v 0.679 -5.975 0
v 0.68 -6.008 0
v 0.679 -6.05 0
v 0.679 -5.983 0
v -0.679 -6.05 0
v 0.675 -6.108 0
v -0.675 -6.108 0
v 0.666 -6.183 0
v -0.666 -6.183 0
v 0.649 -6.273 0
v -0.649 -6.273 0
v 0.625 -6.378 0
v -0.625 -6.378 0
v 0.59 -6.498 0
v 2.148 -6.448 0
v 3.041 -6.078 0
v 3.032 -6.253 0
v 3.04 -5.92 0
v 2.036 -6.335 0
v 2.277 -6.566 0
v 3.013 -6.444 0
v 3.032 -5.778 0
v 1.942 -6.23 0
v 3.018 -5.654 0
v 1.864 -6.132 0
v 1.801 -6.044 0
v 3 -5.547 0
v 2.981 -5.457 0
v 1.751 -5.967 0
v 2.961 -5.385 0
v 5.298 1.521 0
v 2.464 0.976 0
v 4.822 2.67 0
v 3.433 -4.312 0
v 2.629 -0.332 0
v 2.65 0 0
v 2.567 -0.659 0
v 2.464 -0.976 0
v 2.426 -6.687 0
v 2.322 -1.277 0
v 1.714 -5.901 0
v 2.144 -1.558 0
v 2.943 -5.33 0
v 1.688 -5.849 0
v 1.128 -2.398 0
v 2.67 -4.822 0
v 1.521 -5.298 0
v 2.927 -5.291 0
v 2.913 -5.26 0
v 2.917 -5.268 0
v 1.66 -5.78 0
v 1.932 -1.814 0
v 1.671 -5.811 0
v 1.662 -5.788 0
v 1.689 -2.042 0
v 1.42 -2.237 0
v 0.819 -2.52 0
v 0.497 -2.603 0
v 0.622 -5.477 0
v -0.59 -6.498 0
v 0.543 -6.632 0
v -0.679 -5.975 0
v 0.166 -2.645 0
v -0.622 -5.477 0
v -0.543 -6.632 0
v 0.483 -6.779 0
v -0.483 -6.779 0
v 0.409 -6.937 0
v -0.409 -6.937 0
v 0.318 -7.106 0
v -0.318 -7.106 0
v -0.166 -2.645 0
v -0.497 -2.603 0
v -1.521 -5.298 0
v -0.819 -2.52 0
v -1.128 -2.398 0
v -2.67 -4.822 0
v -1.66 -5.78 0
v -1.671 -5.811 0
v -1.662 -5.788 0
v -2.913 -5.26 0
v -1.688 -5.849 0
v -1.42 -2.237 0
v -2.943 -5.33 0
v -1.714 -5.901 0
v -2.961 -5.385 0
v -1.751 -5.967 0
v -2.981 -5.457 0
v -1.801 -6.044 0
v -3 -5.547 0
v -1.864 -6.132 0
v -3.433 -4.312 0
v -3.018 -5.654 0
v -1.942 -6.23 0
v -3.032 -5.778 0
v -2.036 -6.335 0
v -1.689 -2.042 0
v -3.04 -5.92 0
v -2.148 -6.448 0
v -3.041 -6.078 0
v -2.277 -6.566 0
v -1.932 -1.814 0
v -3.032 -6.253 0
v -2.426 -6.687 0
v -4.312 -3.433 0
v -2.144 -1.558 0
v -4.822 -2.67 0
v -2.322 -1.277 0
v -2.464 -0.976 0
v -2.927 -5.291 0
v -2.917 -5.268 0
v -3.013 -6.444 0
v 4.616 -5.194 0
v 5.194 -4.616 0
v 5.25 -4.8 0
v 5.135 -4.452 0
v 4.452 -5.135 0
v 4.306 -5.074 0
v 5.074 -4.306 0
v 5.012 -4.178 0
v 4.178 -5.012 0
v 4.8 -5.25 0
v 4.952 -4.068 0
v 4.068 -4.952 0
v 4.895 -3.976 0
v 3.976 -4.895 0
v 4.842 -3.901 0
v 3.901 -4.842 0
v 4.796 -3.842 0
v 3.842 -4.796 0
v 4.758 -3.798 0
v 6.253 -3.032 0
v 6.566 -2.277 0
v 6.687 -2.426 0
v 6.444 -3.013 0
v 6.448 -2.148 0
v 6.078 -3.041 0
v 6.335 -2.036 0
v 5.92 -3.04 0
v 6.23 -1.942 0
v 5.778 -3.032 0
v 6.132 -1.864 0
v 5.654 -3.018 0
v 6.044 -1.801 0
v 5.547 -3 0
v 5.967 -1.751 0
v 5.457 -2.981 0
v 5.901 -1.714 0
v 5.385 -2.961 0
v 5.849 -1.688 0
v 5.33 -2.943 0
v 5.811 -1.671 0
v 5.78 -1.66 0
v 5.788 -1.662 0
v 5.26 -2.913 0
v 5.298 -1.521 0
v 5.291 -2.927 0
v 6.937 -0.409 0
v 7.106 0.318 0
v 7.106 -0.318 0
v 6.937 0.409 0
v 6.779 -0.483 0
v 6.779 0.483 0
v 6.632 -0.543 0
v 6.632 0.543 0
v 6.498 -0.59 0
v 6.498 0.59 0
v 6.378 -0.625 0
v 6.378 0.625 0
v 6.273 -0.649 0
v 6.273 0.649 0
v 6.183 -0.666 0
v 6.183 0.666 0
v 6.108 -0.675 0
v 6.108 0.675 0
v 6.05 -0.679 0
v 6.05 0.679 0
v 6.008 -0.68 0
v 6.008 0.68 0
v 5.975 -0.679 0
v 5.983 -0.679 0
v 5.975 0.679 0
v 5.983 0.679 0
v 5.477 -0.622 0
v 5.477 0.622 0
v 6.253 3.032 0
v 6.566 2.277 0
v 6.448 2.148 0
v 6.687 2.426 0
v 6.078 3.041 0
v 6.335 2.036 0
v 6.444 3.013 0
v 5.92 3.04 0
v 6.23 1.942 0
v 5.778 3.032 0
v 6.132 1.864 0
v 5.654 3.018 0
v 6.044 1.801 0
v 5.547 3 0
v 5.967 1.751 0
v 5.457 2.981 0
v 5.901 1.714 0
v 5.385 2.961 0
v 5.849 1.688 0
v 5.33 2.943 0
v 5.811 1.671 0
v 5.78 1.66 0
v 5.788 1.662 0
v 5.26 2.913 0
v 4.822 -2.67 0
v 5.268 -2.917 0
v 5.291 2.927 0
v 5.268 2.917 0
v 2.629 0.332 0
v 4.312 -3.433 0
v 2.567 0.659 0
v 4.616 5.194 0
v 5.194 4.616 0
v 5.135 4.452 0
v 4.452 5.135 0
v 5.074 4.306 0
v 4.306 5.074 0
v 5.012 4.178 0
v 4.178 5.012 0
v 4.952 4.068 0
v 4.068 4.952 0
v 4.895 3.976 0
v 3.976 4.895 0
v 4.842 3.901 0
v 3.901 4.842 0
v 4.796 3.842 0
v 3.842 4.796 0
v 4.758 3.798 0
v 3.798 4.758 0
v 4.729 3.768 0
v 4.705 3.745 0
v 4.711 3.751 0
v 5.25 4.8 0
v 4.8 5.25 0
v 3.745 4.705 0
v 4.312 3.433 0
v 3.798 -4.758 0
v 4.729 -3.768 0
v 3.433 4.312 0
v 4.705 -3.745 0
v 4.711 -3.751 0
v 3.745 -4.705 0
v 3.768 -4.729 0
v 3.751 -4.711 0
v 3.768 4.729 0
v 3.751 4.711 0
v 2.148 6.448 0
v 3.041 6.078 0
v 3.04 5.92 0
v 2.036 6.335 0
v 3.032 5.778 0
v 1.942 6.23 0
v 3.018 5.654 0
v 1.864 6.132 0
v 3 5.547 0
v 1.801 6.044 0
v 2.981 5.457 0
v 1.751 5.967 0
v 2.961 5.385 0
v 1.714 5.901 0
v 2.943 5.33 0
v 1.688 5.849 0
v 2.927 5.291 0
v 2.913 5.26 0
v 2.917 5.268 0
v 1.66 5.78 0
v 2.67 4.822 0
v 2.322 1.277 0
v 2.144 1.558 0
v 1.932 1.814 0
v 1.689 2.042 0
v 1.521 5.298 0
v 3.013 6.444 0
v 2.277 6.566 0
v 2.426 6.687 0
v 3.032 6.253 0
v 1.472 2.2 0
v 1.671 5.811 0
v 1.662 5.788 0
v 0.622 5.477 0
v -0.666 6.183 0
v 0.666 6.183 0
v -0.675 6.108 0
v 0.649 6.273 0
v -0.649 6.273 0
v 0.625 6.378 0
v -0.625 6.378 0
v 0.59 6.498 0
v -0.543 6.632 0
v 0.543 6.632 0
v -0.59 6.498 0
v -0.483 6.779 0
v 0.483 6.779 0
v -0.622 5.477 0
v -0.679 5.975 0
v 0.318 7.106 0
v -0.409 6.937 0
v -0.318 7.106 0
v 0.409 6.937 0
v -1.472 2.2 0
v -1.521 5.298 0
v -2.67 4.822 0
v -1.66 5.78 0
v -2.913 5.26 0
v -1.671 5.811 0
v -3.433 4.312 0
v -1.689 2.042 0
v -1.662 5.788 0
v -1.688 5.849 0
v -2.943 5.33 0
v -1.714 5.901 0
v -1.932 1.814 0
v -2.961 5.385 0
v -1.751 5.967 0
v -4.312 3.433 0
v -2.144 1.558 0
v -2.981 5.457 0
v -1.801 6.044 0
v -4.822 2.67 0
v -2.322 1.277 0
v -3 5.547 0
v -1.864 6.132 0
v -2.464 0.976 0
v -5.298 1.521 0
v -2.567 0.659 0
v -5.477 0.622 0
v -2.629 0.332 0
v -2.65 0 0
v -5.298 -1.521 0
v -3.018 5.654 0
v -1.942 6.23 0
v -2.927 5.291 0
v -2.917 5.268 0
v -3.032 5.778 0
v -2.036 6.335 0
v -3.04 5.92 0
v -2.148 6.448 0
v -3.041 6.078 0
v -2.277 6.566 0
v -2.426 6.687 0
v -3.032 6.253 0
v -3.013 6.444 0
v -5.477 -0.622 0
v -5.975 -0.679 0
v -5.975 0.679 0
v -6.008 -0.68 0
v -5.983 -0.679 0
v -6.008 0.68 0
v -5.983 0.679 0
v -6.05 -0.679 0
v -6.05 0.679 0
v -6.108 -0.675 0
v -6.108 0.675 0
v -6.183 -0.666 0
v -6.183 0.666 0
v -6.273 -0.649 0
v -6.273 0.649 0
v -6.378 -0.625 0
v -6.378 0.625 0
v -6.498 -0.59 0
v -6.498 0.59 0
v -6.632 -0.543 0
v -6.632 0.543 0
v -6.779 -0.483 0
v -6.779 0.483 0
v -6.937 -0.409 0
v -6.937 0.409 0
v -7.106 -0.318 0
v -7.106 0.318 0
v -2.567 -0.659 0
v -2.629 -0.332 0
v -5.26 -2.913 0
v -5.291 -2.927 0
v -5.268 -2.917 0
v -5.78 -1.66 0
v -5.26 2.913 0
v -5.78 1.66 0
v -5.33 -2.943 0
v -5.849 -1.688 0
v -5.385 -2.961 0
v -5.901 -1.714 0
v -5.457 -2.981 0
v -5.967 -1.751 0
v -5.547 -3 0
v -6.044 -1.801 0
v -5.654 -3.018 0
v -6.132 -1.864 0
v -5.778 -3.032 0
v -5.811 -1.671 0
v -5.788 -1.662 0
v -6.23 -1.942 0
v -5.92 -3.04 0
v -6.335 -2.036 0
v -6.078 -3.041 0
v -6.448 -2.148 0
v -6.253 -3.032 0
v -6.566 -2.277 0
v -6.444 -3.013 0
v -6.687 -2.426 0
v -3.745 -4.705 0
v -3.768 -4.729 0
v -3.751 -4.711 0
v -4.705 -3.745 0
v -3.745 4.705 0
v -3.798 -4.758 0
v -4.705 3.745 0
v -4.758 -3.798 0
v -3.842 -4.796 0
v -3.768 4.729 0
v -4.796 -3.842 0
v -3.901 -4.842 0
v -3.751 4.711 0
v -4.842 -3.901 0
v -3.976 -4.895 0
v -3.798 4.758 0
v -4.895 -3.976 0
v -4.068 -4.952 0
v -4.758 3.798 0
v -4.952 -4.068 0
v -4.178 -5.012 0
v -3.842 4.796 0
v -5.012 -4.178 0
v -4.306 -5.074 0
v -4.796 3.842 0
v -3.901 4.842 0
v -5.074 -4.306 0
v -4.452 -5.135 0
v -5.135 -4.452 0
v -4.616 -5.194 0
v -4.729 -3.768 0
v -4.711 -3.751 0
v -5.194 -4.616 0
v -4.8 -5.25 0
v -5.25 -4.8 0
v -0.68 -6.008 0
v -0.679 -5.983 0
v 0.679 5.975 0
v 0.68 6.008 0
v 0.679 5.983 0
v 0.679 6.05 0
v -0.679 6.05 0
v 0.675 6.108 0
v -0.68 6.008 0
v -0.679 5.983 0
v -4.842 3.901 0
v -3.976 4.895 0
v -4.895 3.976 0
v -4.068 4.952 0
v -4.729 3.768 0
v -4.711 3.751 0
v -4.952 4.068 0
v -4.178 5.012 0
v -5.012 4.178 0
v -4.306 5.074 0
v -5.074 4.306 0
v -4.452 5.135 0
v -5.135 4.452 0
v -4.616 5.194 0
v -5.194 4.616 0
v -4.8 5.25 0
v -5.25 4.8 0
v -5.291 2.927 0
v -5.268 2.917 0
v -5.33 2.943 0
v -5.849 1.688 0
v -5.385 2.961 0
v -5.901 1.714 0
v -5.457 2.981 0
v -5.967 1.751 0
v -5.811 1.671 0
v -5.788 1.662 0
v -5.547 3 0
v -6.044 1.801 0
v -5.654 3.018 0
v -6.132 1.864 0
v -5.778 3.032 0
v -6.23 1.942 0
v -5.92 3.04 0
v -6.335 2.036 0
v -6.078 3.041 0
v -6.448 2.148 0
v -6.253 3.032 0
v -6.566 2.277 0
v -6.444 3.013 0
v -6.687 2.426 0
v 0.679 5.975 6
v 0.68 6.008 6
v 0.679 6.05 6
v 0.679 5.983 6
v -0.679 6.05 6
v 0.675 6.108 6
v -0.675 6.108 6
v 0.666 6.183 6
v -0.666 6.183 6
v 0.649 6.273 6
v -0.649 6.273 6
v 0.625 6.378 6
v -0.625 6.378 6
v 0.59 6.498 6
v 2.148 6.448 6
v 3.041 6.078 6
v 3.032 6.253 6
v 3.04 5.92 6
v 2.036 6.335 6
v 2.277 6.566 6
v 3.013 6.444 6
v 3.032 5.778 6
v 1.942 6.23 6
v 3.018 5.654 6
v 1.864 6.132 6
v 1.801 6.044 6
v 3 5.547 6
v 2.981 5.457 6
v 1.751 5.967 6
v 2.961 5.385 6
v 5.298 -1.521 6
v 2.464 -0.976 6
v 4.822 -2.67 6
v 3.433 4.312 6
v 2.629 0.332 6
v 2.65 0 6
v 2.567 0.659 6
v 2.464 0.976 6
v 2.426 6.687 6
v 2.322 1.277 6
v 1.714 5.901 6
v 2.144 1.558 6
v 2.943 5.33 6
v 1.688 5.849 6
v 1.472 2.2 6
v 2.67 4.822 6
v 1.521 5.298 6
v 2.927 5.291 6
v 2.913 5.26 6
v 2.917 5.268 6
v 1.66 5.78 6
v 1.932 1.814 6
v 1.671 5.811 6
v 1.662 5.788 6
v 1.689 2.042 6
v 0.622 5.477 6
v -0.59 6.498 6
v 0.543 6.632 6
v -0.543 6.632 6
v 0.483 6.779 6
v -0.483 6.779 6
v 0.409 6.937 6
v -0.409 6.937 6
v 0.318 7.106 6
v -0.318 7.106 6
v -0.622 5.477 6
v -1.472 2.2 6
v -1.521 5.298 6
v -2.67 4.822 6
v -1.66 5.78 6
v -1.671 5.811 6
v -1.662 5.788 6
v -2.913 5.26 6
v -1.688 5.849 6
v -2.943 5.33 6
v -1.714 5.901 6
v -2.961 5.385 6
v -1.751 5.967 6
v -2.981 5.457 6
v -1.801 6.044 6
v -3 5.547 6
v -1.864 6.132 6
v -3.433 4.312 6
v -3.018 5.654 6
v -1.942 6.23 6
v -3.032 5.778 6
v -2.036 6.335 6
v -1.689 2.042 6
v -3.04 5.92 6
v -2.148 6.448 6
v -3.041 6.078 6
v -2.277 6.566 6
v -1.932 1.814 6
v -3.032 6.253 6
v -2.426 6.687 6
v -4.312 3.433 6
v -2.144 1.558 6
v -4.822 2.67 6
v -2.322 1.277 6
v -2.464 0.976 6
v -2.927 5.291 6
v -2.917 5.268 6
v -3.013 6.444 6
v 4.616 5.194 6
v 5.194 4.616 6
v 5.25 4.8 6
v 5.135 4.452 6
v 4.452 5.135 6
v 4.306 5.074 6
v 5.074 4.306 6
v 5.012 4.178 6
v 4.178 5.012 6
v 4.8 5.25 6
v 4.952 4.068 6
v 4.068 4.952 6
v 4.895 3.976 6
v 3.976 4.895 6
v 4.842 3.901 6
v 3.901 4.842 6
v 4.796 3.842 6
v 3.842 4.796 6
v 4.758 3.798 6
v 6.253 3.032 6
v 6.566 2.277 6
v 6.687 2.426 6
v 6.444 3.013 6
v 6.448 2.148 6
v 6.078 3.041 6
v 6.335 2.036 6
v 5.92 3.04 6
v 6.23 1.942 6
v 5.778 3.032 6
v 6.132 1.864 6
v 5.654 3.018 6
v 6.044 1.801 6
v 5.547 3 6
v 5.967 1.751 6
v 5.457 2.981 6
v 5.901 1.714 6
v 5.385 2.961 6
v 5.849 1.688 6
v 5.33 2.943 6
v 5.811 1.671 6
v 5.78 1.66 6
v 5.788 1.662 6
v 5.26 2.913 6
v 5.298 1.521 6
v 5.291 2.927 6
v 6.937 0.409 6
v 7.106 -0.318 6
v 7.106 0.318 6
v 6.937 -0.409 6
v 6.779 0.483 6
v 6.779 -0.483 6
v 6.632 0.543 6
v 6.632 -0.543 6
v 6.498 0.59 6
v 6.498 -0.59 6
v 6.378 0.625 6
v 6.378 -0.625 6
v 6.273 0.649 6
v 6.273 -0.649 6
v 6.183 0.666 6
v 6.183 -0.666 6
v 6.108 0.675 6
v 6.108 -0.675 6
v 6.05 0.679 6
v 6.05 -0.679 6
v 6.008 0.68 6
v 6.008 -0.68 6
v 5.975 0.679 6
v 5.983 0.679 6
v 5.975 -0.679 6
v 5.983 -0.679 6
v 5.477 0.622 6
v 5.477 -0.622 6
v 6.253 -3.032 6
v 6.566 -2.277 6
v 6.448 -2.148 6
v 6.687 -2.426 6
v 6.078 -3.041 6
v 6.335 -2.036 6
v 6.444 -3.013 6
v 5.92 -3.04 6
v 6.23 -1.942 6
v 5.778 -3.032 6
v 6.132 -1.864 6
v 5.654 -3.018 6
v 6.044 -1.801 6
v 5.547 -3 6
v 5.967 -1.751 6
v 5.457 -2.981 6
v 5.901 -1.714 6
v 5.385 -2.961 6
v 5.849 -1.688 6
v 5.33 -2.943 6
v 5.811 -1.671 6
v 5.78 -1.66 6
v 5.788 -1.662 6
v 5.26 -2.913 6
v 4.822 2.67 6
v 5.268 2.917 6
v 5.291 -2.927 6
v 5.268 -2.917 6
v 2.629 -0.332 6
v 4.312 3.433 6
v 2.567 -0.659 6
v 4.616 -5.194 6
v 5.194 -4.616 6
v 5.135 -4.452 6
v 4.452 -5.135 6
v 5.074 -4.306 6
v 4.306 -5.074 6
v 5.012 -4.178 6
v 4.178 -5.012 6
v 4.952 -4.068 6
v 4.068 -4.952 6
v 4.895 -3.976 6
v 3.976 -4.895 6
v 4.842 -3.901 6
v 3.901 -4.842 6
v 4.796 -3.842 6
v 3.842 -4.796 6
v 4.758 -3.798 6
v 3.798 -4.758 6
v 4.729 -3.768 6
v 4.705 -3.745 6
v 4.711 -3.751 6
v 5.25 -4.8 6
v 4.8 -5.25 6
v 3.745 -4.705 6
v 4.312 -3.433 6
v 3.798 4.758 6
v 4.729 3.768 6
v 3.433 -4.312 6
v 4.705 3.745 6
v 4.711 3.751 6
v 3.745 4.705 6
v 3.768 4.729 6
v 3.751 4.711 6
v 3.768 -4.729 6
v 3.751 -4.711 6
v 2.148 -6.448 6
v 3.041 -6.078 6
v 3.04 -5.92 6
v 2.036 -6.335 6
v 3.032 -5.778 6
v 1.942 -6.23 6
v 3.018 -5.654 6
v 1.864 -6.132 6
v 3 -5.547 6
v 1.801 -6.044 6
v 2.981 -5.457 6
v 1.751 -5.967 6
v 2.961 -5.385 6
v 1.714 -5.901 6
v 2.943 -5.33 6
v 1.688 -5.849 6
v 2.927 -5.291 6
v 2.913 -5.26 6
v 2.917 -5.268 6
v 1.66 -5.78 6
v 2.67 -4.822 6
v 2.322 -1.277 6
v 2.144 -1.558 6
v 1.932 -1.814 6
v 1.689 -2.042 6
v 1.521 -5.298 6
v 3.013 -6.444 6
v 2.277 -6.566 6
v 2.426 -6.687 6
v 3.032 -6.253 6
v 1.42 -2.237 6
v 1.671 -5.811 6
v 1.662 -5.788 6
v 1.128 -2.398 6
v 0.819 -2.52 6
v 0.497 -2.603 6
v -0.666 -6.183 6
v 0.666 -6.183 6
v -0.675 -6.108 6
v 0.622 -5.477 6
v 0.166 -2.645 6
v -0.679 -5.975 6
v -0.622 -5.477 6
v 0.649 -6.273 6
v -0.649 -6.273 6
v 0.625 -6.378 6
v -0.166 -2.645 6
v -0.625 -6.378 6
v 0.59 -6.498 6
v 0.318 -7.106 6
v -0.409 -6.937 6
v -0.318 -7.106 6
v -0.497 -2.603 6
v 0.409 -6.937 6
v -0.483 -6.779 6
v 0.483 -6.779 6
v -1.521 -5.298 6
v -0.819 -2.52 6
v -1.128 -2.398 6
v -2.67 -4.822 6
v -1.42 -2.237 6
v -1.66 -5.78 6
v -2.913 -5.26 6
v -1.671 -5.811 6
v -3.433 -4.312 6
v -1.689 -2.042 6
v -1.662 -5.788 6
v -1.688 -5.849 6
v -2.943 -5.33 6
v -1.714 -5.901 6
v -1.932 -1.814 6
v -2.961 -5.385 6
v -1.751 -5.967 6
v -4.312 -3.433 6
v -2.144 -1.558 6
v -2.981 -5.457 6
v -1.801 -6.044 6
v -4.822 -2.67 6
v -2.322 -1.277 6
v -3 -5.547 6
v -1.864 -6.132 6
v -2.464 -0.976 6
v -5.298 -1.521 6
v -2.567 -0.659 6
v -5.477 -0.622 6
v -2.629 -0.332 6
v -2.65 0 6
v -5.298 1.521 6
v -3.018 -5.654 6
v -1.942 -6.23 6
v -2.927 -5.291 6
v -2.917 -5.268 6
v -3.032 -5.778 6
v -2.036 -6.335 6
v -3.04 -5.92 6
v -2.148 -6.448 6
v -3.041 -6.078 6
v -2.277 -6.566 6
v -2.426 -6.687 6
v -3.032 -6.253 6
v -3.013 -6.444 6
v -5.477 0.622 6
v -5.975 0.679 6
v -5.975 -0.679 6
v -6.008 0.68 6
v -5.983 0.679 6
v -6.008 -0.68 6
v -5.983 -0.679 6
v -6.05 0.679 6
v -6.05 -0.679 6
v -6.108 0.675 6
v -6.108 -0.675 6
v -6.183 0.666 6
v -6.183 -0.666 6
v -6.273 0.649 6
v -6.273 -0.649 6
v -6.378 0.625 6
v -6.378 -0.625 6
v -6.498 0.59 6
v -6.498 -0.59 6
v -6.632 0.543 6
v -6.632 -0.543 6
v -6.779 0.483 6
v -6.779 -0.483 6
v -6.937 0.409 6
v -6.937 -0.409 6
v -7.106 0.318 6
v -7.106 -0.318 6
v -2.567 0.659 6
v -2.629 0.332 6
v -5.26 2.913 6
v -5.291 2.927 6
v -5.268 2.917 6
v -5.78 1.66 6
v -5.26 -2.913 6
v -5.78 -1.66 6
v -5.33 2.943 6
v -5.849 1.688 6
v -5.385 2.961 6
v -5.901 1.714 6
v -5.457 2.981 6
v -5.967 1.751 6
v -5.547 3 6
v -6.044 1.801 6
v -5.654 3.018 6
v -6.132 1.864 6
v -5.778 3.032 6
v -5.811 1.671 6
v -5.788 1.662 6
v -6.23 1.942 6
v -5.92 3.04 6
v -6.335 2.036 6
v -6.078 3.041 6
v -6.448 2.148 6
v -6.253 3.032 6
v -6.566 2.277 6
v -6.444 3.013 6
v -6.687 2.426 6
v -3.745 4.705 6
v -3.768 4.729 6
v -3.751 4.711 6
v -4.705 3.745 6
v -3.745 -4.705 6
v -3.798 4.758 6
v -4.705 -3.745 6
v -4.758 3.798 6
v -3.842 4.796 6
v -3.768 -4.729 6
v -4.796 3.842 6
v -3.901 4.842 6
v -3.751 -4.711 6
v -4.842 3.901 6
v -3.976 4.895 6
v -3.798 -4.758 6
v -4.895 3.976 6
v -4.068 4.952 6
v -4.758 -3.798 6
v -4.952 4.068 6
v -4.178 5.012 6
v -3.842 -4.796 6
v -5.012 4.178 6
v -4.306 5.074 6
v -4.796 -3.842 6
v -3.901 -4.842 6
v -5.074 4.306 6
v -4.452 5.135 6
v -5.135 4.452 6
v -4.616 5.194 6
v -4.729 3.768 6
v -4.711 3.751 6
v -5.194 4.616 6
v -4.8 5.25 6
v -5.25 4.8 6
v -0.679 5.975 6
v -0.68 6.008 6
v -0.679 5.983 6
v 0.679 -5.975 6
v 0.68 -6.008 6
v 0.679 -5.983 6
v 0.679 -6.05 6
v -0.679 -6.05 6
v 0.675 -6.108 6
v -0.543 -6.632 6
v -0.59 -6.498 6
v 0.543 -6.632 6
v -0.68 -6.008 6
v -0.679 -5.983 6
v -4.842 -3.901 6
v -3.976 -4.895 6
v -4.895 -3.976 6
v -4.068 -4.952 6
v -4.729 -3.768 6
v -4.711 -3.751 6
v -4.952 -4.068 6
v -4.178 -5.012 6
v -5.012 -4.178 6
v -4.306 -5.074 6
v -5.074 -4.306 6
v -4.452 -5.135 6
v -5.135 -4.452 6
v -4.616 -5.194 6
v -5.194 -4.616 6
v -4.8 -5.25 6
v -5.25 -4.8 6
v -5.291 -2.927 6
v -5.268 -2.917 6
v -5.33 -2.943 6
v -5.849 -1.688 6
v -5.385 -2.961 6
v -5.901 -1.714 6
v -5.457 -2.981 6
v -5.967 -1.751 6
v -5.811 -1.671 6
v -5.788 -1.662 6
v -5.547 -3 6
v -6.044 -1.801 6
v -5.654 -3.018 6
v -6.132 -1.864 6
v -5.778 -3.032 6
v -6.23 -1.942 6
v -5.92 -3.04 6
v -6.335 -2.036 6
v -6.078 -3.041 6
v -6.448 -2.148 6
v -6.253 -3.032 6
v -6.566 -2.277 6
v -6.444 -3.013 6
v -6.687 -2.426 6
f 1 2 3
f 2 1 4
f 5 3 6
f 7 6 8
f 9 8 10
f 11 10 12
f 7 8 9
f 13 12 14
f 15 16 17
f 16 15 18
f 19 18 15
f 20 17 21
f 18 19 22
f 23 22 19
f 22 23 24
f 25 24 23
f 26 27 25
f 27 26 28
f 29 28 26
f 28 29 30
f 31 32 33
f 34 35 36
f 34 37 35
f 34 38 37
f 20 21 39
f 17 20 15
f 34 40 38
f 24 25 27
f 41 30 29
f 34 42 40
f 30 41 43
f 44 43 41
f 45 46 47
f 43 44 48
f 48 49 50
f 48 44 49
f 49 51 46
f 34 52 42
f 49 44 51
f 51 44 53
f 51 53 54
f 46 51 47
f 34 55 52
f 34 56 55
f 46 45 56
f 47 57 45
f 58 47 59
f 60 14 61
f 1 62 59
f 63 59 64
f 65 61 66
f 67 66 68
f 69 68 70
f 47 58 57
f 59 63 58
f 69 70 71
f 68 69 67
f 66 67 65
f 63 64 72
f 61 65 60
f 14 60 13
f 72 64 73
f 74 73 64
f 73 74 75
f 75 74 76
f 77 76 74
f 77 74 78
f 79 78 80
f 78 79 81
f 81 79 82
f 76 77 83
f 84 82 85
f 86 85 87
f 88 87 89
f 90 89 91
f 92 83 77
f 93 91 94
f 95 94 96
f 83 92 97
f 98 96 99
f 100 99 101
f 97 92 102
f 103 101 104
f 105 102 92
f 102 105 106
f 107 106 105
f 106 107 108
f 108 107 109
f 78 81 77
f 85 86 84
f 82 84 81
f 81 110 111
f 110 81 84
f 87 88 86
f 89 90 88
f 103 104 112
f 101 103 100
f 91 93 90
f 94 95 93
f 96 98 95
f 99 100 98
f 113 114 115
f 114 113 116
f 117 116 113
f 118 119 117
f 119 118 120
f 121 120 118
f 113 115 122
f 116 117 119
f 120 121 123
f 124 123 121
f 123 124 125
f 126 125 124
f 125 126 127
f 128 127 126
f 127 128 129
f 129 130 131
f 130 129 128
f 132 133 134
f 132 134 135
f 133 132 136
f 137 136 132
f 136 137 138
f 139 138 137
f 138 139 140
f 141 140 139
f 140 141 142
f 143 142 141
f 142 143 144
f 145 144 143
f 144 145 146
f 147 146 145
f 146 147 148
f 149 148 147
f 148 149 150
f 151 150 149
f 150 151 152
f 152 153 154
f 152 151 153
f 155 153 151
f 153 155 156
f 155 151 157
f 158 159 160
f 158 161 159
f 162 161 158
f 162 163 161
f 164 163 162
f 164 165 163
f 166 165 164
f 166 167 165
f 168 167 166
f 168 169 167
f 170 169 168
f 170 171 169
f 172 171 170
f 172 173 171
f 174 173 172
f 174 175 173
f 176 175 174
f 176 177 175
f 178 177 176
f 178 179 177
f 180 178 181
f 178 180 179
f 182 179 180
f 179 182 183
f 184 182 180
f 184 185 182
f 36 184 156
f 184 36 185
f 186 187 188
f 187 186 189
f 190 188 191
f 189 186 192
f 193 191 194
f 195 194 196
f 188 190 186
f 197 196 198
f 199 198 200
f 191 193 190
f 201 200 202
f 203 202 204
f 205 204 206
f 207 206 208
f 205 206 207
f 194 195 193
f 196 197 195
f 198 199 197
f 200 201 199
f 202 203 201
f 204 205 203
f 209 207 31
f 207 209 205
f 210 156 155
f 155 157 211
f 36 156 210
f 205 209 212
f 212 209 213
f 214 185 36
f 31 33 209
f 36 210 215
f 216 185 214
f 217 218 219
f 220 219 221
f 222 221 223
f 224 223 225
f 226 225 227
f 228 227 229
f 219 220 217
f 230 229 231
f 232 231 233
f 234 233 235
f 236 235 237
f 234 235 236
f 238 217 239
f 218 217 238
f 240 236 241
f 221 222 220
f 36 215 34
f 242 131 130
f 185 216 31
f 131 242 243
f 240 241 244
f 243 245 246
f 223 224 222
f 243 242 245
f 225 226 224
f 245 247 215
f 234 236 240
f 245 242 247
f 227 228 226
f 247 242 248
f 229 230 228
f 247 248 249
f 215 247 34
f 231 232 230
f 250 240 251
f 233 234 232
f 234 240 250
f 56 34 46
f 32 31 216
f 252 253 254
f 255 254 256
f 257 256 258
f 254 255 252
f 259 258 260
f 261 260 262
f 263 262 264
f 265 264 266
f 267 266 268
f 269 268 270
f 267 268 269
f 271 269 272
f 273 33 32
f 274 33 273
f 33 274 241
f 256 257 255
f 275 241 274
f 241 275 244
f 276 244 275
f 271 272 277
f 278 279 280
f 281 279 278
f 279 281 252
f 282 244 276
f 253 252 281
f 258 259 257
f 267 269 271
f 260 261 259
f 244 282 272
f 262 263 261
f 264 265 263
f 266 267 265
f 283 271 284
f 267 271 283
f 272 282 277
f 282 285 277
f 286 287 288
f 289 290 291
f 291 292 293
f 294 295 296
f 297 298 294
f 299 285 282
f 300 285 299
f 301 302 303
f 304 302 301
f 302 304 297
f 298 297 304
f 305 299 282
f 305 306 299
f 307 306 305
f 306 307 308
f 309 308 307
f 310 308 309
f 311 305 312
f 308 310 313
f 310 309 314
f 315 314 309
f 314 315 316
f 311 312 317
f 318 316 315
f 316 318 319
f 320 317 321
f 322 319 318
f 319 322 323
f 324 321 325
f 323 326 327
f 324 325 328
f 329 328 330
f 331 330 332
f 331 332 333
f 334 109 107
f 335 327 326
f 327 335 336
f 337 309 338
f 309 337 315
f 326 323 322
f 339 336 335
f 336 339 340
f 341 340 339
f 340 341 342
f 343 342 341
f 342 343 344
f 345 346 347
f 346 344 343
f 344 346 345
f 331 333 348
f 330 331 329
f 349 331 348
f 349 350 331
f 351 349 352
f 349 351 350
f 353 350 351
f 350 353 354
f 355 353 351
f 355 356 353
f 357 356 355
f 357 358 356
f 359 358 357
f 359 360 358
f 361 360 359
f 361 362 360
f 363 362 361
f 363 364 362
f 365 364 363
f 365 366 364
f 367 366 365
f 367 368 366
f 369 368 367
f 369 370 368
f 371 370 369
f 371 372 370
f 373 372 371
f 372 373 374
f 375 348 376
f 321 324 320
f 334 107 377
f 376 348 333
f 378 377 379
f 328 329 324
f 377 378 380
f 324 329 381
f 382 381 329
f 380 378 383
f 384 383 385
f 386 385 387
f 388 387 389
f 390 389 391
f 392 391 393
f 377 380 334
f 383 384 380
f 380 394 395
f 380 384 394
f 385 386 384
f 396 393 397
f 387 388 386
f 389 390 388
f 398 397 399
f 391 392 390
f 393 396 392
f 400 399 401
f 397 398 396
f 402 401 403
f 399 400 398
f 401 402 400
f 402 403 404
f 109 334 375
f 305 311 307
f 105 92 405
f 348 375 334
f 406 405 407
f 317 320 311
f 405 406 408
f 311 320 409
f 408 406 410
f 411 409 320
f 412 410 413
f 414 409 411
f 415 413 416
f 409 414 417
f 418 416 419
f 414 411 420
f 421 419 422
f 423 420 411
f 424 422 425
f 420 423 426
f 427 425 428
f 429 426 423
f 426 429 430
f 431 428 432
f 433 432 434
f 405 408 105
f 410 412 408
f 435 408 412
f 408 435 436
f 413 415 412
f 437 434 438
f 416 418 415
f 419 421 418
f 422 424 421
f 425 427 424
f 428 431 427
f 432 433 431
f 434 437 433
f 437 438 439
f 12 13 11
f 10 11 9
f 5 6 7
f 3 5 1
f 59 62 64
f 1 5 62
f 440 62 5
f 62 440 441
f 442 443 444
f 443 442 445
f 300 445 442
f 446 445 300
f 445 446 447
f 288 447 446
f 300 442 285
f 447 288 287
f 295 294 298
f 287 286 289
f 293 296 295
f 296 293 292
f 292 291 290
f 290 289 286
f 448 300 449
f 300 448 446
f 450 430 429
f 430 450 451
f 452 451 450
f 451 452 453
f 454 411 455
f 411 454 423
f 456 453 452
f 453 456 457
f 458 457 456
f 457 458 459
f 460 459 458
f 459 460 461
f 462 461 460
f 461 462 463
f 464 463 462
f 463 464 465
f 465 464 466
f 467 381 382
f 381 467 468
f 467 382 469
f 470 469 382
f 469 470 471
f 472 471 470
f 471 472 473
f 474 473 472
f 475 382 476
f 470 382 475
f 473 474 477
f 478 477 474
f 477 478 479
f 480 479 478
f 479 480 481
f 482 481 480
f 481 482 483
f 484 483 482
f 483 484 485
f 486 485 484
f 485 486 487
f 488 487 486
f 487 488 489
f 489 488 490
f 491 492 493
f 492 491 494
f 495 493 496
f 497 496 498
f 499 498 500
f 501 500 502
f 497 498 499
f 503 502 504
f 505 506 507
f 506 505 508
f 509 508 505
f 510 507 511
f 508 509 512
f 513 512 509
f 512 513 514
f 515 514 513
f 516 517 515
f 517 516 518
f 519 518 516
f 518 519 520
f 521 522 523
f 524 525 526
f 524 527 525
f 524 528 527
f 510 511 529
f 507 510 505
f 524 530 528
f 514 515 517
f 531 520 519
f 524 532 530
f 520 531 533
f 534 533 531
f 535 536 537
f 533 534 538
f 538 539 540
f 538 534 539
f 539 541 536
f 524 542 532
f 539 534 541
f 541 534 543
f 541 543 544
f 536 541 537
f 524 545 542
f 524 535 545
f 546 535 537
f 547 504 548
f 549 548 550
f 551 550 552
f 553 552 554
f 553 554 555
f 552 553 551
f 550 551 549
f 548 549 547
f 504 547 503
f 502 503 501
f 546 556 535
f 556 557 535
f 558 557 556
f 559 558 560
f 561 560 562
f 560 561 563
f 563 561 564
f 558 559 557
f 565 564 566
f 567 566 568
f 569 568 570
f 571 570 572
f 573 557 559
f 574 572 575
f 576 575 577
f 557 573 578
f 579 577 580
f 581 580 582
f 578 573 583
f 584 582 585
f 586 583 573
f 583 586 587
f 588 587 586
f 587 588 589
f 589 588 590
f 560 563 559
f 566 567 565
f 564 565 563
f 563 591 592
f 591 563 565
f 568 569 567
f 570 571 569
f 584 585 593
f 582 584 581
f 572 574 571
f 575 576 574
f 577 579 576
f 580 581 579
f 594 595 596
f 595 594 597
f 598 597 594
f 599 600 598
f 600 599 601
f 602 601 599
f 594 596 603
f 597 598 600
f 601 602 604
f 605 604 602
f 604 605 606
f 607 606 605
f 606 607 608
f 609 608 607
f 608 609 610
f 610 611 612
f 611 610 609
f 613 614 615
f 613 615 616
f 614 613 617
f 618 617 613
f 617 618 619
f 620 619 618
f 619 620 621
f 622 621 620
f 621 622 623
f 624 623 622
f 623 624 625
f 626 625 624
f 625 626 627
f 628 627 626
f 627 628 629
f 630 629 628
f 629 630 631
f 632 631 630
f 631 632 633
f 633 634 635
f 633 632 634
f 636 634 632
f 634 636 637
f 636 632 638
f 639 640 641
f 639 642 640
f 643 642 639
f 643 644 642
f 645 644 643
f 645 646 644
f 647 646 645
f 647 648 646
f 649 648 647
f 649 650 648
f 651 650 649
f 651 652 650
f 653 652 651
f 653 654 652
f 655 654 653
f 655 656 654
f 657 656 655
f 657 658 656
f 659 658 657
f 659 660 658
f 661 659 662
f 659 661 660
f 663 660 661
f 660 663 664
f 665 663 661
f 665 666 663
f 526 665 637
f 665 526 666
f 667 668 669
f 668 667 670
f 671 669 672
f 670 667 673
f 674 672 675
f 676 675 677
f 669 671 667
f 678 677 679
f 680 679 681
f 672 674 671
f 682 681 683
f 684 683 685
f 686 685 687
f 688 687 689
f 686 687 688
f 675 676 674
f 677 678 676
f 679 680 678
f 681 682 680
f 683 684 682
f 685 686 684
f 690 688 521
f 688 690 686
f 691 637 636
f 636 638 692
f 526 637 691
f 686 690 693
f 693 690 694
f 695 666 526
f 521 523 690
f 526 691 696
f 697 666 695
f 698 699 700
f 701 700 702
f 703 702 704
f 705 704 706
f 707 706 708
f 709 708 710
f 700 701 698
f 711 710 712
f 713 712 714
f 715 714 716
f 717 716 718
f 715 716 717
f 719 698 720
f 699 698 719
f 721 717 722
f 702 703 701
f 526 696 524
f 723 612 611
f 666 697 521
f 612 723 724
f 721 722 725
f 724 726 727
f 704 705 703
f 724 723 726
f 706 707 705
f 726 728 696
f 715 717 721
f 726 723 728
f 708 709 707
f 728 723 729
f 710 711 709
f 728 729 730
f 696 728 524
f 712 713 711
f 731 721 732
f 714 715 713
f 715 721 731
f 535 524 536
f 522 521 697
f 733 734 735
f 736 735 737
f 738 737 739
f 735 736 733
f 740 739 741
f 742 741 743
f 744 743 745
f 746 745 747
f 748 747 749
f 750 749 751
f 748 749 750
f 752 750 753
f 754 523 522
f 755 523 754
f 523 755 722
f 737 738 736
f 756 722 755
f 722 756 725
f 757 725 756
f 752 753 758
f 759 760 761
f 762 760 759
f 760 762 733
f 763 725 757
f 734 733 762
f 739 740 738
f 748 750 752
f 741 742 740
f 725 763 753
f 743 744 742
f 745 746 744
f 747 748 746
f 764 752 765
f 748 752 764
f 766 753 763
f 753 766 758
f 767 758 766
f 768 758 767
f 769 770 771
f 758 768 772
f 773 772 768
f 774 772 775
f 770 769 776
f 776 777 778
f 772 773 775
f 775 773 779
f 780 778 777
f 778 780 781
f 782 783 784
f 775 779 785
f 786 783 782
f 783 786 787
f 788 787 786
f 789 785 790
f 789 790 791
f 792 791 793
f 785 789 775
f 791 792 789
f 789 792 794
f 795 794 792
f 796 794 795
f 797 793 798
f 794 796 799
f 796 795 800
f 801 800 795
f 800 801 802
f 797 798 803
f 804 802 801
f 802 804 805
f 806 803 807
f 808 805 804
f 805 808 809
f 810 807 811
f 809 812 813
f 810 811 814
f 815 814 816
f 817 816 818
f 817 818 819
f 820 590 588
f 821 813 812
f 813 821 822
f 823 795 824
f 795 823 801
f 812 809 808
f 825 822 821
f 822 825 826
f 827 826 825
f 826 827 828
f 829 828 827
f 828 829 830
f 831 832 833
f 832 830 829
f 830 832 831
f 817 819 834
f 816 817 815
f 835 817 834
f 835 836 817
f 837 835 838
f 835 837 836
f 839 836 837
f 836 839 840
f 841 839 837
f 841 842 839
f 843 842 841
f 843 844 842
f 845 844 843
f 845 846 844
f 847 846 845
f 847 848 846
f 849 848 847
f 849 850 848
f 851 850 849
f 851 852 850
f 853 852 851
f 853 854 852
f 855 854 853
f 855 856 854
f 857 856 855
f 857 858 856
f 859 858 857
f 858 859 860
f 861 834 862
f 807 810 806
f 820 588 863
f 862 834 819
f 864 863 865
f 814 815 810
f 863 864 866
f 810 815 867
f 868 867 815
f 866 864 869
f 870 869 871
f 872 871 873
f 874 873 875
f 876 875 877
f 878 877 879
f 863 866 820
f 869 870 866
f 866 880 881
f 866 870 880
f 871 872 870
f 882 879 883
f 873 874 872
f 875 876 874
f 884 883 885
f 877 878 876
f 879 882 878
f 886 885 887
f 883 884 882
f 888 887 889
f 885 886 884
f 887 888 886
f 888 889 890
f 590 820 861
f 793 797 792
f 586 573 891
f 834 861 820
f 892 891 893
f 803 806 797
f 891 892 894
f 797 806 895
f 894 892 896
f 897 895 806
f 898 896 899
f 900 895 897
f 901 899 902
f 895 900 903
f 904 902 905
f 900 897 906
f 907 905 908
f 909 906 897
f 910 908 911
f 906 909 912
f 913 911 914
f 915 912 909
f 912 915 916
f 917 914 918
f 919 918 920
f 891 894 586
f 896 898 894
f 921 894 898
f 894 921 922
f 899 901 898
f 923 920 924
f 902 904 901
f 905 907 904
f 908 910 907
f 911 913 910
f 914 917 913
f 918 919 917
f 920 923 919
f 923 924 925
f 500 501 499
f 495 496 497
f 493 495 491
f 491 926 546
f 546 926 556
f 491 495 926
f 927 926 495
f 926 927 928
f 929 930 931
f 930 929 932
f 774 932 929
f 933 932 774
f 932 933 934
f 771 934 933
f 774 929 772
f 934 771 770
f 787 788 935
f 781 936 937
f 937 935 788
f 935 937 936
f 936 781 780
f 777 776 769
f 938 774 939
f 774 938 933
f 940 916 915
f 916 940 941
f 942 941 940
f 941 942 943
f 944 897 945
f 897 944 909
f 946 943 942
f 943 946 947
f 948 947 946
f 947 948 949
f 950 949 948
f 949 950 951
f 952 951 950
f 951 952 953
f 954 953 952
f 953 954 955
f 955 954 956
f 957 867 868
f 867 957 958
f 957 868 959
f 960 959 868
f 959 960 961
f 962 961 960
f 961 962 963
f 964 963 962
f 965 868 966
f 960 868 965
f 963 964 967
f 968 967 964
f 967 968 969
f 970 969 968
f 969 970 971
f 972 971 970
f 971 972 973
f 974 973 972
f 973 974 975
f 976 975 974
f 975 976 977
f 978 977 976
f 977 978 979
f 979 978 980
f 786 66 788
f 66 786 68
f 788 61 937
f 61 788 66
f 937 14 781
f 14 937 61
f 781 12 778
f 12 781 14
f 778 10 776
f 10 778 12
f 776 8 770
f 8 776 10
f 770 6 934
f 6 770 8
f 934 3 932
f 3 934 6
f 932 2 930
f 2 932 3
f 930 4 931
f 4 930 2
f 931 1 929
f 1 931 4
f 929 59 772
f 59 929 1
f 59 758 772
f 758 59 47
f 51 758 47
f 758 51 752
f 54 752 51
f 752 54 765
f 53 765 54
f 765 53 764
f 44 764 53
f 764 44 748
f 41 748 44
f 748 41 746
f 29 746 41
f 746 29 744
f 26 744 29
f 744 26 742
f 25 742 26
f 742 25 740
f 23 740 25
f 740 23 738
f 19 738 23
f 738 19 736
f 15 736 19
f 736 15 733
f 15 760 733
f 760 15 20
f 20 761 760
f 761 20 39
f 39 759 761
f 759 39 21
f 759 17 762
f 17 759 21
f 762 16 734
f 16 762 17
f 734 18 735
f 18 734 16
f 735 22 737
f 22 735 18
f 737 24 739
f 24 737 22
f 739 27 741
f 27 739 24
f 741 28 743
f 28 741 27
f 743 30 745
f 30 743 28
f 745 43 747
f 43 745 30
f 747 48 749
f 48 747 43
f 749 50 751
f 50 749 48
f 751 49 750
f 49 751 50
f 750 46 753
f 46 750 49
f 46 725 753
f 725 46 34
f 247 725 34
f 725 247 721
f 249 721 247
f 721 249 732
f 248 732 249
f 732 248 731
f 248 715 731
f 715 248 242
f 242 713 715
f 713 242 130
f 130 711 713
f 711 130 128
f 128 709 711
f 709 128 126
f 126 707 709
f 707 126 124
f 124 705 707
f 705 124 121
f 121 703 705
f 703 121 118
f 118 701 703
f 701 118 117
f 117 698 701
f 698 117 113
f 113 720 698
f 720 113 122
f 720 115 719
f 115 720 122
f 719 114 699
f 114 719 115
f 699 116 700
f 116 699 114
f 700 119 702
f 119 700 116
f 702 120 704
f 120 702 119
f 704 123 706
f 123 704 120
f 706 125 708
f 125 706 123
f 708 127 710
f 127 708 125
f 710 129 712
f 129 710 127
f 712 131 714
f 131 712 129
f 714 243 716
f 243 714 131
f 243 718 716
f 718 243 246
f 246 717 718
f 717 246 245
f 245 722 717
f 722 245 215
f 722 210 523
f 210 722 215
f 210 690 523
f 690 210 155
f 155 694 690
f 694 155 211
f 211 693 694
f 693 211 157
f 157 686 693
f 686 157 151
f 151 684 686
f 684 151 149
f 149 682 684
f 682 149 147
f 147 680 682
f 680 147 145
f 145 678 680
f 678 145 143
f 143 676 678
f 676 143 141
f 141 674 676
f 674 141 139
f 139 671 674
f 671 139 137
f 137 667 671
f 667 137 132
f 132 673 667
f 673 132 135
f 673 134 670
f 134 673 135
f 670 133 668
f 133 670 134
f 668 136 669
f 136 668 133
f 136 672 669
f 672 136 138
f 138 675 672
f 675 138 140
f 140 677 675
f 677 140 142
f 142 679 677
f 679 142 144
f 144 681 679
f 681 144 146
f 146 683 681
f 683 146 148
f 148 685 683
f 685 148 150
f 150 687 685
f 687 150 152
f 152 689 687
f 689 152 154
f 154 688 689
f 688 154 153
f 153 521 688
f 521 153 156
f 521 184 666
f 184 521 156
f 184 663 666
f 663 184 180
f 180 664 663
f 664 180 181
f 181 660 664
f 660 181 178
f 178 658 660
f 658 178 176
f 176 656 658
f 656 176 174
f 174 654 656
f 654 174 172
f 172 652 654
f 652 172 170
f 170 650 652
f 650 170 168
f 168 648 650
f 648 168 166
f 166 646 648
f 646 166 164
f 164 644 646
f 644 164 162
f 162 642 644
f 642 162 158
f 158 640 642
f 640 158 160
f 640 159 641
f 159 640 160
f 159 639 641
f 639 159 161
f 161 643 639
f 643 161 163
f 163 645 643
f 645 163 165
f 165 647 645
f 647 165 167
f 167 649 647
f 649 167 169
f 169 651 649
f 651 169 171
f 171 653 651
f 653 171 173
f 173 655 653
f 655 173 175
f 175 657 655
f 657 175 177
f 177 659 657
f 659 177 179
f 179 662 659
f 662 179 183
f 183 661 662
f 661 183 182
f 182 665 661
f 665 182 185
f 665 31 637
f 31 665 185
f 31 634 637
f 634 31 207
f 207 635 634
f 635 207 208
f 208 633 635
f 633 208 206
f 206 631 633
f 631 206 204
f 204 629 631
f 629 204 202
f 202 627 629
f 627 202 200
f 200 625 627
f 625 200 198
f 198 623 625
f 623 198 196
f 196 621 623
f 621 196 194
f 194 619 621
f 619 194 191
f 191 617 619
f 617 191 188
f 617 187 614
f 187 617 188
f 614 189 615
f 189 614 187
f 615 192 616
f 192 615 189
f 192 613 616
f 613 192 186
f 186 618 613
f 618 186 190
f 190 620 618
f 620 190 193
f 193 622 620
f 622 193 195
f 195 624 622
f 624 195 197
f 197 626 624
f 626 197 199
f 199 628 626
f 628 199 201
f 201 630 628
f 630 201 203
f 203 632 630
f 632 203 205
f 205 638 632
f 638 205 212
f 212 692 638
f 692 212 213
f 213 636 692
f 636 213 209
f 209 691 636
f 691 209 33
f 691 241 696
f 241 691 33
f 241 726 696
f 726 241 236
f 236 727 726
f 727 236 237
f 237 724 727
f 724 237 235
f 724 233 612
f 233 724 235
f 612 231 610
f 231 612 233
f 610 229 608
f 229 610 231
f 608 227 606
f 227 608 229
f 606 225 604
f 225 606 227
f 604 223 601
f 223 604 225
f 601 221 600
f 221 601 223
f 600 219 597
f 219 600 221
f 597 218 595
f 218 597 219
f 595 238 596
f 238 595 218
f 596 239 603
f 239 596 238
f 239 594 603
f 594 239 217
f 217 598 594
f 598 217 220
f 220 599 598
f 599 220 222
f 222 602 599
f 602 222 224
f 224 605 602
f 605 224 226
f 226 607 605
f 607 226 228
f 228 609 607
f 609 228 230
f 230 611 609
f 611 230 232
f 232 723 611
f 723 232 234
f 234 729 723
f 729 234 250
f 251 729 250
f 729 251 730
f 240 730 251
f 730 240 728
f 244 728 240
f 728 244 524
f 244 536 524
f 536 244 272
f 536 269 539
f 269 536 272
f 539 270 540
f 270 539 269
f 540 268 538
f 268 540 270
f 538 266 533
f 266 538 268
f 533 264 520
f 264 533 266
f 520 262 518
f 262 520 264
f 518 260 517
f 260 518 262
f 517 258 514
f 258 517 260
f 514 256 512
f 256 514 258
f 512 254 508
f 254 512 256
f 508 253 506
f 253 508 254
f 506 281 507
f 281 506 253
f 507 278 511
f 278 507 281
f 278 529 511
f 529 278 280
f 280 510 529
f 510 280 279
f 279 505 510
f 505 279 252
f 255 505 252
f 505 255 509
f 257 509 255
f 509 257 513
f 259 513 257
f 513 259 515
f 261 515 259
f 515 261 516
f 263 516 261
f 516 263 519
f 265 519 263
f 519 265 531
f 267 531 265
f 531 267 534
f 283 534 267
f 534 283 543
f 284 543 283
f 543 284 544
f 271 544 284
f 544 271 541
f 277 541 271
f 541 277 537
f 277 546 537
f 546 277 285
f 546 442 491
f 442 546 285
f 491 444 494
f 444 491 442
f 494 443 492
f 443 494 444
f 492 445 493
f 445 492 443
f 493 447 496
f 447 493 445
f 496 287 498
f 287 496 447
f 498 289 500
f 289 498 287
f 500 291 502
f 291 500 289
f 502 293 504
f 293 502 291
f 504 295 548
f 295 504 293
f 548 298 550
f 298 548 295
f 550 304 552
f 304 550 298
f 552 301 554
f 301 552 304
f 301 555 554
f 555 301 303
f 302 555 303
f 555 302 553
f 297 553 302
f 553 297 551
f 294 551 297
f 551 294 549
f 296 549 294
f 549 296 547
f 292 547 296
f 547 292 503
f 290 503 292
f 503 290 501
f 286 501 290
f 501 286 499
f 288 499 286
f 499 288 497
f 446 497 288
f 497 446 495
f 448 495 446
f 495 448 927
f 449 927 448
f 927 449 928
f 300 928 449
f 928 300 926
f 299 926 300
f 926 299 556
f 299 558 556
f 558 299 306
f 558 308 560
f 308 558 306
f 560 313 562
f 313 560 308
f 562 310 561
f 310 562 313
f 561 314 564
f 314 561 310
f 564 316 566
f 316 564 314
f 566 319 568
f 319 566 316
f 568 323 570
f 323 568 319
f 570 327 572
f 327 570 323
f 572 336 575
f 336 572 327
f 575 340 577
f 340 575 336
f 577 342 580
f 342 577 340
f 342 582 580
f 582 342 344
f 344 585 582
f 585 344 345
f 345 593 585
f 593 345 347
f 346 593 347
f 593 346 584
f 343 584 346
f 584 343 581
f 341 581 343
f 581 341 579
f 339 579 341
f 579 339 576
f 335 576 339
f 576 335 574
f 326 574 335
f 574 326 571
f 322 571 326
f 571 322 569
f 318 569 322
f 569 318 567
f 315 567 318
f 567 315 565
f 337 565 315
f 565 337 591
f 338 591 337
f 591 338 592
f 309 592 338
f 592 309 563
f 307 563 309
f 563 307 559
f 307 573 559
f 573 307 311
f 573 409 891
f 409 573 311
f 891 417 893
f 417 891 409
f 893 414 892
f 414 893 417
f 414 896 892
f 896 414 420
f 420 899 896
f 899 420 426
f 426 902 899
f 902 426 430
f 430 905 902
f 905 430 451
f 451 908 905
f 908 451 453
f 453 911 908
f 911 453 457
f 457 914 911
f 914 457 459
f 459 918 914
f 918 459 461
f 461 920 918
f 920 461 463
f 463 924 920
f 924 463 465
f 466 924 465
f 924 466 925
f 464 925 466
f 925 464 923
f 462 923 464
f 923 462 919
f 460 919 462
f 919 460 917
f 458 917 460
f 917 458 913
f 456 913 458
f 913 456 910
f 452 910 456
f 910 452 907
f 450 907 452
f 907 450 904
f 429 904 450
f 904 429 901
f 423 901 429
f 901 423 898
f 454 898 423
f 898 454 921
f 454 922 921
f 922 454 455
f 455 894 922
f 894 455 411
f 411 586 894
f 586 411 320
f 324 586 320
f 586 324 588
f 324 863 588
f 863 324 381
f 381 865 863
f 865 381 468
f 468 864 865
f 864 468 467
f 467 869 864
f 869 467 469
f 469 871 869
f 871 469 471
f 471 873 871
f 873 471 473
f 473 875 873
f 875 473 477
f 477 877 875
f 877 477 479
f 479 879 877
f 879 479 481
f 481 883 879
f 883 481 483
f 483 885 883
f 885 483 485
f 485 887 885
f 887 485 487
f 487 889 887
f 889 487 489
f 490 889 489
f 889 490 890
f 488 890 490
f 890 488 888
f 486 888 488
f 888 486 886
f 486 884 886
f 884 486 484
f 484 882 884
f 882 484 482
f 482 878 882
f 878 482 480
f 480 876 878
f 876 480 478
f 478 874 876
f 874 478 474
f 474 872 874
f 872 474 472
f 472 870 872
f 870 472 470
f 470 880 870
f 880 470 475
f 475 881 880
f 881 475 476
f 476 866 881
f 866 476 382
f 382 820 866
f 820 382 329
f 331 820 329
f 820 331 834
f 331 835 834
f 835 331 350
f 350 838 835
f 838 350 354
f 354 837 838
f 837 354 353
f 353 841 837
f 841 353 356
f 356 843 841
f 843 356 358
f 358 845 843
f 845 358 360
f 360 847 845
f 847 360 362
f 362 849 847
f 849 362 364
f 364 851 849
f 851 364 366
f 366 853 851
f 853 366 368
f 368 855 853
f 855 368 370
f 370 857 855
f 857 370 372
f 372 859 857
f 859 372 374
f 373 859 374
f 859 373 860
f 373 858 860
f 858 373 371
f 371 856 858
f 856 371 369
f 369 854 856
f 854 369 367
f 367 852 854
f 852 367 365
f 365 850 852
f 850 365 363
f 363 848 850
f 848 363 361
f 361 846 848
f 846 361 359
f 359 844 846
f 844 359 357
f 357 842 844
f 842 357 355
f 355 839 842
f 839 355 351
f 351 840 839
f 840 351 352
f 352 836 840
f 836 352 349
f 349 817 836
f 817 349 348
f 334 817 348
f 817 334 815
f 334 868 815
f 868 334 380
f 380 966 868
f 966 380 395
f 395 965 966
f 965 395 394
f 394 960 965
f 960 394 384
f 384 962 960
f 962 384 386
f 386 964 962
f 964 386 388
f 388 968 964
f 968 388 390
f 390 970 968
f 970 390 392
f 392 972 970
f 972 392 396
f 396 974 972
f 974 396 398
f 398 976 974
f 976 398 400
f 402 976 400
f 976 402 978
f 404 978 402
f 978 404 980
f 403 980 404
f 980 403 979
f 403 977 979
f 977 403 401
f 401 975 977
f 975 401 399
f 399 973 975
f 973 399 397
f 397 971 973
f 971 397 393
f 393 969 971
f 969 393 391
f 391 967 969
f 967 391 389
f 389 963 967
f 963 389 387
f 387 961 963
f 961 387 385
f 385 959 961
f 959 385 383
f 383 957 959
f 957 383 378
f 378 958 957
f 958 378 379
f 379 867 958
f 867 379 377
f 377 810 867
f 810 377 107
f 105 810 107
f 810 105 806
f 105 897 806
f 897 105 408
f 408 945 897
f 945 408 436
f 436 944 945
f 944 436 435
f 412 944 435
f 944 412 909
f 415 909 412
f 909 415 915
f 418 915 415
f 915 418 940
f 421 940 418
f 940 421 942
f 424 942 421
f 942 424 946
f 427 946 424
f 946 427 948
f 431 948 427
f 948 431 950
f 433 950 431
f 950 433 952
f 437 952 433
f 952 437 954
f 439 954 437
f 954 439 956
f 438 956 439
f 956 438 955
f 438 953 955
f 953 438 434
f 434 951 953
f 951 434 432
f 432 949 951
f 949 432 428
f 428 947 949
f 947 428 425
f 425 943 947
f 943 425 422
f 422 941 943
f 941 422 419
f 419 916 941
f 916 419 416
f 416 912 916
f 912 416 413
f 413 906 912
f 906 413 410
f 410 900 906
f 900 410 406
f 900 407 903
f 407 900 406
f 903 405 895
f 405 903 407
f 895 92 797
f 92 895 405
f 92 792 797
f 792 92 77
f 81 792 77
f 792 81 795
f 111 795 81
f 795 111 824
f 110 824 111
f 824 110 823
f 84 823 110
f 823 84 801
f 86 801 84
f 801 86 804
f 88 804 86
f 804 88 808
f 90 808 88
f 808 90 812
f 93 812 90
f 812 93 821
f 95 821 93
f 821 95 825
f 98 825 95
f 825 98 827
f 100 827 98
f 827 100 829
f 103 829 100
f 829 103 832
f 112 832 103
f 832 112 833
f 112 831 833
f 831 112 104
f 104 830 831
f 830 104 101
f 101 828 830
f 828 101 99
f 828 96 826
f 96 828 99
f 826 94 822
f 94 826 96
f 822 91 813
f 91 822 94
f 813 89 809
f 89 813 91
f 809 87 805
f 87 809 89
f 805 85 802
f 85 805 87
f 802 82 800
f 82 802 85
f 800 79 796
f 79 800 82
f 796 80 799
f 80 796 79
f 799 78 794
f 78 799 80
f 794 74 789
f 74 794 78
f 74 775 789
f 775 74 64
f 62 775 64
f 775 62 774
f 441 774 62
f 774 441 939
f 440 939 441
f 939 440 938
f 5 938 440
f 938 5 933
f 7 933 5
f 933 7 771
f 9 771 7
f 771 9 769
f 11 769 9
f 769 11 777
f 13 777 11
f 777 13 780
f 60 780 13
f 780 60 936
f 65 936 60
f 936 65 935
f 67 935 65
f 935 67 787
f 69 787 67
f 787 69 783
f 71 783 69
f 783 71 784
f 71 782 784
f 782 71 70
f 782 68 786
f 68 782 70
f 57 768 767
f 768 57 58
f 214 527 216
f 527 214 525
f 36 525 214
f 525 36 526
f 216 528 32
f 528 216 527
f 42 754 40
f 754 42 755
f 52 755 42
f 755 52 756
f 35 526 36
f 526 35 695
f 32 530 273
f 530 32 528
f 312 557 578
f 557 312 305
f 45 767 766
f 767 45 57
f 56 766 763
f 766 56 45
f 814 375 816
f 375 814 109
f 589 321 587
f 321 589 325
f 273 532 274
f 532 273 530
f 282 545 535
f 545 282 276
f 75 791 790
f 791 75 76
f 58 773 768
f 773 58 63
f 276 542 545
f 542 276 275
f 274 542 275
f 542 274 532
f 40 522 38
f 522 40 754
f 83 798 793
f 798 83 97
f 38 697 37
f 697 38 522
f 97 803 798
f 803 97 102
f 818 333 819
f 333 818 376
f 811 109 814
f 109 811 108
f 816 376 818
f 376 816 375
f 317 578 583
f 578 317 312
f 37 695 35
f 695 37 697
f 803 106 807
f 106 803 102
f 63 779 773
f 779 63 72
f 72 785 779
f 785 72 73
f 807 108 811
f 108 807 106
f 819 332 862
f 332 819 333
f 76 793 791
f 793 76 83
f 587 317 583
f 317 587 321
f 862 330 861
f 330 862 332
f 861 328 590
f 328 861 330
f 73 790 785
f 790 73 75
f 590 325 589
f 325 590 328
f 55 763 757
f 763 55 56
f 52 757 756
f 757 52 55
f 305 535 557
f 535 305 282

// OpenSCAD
// Rack and pinion gears GPL (c) SASA October 2013.
//
// Very simple rack and pinion gear based on GPL code.
//
// I've made corrections to both rack and gear code I used (below) and unified
// and simplified both bits of code.  Corrects the use of circular pitch so
// rack and pinion match nicely.  Ammendments to the code and interface to
// simplify use and improve readability. Many bells and whistles dropped in
// favour of being dead simple.  I also opted for hard wiring the pressure
// angle to 20 degrees since this seemed a kind of standard.
//
// Based on the works (thanks!): Parametric Involute Bevel and Spur Gears by
// GregFrost GNU GPL license.  http://www.thingiverse.com/thing:3575 Parametric
// Modular Rack by Mark "Ckaos" Moissette GNU GPL license.  (Rack based on the
// work of MattMoses and Fdavies
// http://forums.reprap.org/read.php?1,51452,52099#msg-52099 and Forrest Higgs:
// 
// The originals have many fine additions such as helical gears which I've
// dropped in favour of simplicity (as befits my needs) - it wouldn't be a big
// jobs to nobble my changes backwards or their features forwards.
abit=0.01;
pi=3.1415926535897932384626433832795;
$fn=50;



module rack(cp, N, width, thickness, lip=0){
// cp = circular pitch - for rack = pitch in mm/per tooth
// N = number of teeth
// width = width of rack
// thickness = thickness of support under teeth (0 for no support)
// lip = how thick of a radius the goove and nub are
lip =lip/2;

	a = 1.0*cp/pi; // addendum (also known as "module")
	d = 1.1*cp/pi; // dedendum (this is set by a standard)
	height=(d+a);

	// find the tangent of pressure angle once
	tanPA = tan(20);
	// length of bottom and top horizontal segments of tooth profile
	botL = (cp/2 - 2*d*tanPA);
	topL = (cp/2 - 2*a*tanPA);

	slantLng=tanPA*height;
	realBase=2*slantLng+topL;

	offset=topL+botL+2*slantLng;
	length=(realBase+botL)*N;
	echo("length: ", length);
	supportSize=width;
	translate([botL/2,0,0])
	rotate([90,0,0]){
		translate([0,supportSize/2,0]){
			union(){
				difference(){
					cube(size=[length,width,thickness],center=true);
					translate([0,-width/2,0])rotate([0,90,0])cylinder(r=lip,h=length+abit,center=true);
					}
				translate([0,width/2,0])rotate([0,90,0])cylinder(r=lip,h=length,center=true);
				for (i = [0:N-1]){
					translate([i*offset-length/2+realBase/2,0,thickness/2]){
						trapezoid([topL,supportSize],[realBase,supportSize],height);
						}
					}
				}
			}
		}
	}

module rackCutout(length, thickness, width, lip=0, clearance){
// cp = circular pitch - for rack = pitch in mm/per tooth
// N = number of teeth
// width = width of rack
// thickness = thickness of support under teeth (0 for no support)
// lip = how thick of a radius the goove and nub are
	lip =(lip+clearance)/2;

	union(){
		difference(){
			cube(size=[length,width+clearance,thickness+clearance],center=true);
			translate([0,-width/2,0])rotate([0,90,0])cylinder(r=lip,h=length+abit,center=true);
			}
		translate([0,width/2,0])rotate([0,90,0])cylinder(r=lip,h=length,center=true);
	}
}


module pinion (cp, N, width, shaft_diameter, backlash=0){
// cp= circular pitch - for pinion pitch in mm/per as measured along the ptich radius (~1/2 way up tooth)
// N= number of teeth
// width= width of the gear
// shaft_diameter= diameter of hole for shaft
// backlash - I think this is just a bodge for making things fit when printed but I never tested it

	if (cp==false && diametral_pitch==false) 
		echo("MCAD ERROR: pinion module needs either a diametral_pitch or cp");

	//Convert diametrial pitch to our native circular pitch
	cp = (cp!=false?cp:180/diametral_pitch);

	// Pitch diameter: Diameter of pitch circle.
	pitch_diameter  =  N * cp / pi;
	pitch_radius = pitch_diameter/2;
	echo ("Teeth:", N, " Pitch radius:", pitch_radius);
	// Base Circle
	base_radius = pitch_radius*cos(20);

	// Addendum: Radial distance from pitch circle to outside circle.
	addendum = cp/pi;

	//Outer Circle
	outer_radius = pitch_radius+addendum;

	// Dedendum: Radial distance from pitch circle to root diameter
	dedendum = addendum*1.1;

	// Root diameter: Diameter of bottom of tooth spaces.
	root_radius = pitch_radius-dedendum;

	backlash_angle = backlash / pitch_radius * 180 / pi;
	half_thick_angle = (360 / N - backlash_angle) / 4;

	difference(){
		linear_extrude (height=width, convexity=10, twist=0)
		pinion_shape(N, pitch_radius = pitch_radius, root_radius = root_radius,
			base_radius = base_radius, outer_radius = outer_radius,
			half_thick_angle = half_thick_angle, involute_facets=0);

		translate([0,0,-1]) cylinder(r=shaft_diameter/2,h=2+width);
		}

	echo("Root radius =",root_radius,"\nPitch radius=",pitch_radius,"\n Tip radius=",outer_radius,"\n");
	}

module pinion_shape ( N, pitch_radius, root_radius, base_radius, outer_radius, half_thick_angle, involute_facets) {
	union(){
		rotate (half_thick_angle) circle ($fn=N*2, r=root_radius);
		for (i = [1:N]) {
			rotate ([0,0,i*360/N]) {
				involute_pinion_tooth (
					pitch_radius = pitch_radius,
					root_radius = root_radius,
					base_radius = base_radius,
					outer_radius = outer_radius,
					half_thick_angle = half_thick_angle,
					involute_facets=involute_facets);
				}
			}
		}
	}

module involute_pinion_tooth ( pitch_radius, root_radius, base_radius, outer_radius, half_thick_angle, involute_facets) {
	min_radius = max (base_radius,root_radius);

	pitch_point = involute (base_radius, involute_intersect_angle (base_radius, pitch_radius));
	pitch_angle = atan2 (pitch_point[1], pitch_point[0]);
	centre_angle = pitch_angle + half_thick_angle;

	start_angle = involute_intersect_angle (base_radius, min_radius);
	stop_angle = involute_intersect_angle (base_radius, outer_radius);

	res=(involute_facets!=0)?involute_facets:($fn==0)?5:$fn/4;

	union () {
		for (i=[1:res])
		assign ( point1=involute (base_radius,start_angle+(stop_angle - start_angle)*(i-1)/res), point2=involute (base_radius,start_angle+(stop_angle - start_angle)*i/res)) {
			assign (
				side1_point1=rotate_point (centre_angle, point1),
				side1_point2=rotate_point (centre_angle, point2),
				side2_point1=mirror_point (rotate_point (centre_angle, point1)),
				side2_point2=mirror_point (rotate_point (centre_angle, point2))) {
				polygon ( points=[[0,0],side1_point1,side1_point2,side2_point2,side2_point1], paths=[[0,1,2,3,4,0]]);
				}
			}
		}
	}

// Mathematical Functions
//===============

// Finds the angle of the involute about the base radius at the given distance (radius) from it's center.
//source: http://www.mathhelpforum.com/math-help/geometry/136011-circle-involute-solving-y-any-given-x.html

function involute_intersect_angle (base_radius, radius) = sqrt (pow (radius/base_radius, 2) - 1) * 180 / pi;

// Calculate the involute position for a given base radius and involute angle.

function rotated_involute(rotate,base_radius,involute_angle)=[cos(rotate)*involute(base_radius, involute_angle)[0]+sin(rotate)*involute(base_radius, involute_angle)[1],cos(rotate)*involute(base_radius, involute_angle)[1]-sin(rotate)*involute(base_radius, involute_angle)[0]];

function mirror_point(coord)=[coord[0],-coord[1]];

function rotate_point(rotate,coord)=[cos(rotate)*coord[0]+sin(rotate)*coord[1],cos(rotate)*coord[1]-sin(rotate)*coord[0]];

function involute (base_radius, involute_angle)=[base_radius*(cos(involute_angle)+involute_angle*pi/180*sin(involute_angle)),base_radius*(sin(involute_angle)-involute_angle*pi/180*cos(involute_angle))];




module trapezoid(top,base,height){
	//echo ("test",base[0]);
	basePT1=[ -base[0]/2, base[1]/2, 0];
	basePT2=[ base[0]/2, base[1]/2, 0];
	basePT3=[ base[0]/2, -base[1]/2, 0];
	basePT4=[ -base[0]/2, -base[1]/2, 0];
	topPT1=[ -top[0]/2, top[1]/2, height];
	topPT2=[ top[0]/2, top[1]/2, height];
	topPT3=[ top[0]/2, -top[1]/2, height];
	topPT4=[ -top[0]/2, -top[1]/2, height];
	polyhedron(points=[ basePT1, basePT2, basePT3, basePT4, topPT1, topPT2, topPT3, topPT4],triangles=[[0,1,2], [0,2,3],[3,7,0], [7,4,0],[1,6,2], [1,5,6],[2,6,3], [3,6,7],[5,1,0],[4,5,0],[7,5,4],[5,7,6]]);
	}

// a simple pinion and translation / rotation to make it mesh the rack
pinion(2.513,16,6,5.3);
translate([-3,2.2,0])cube([6,1,6]);
